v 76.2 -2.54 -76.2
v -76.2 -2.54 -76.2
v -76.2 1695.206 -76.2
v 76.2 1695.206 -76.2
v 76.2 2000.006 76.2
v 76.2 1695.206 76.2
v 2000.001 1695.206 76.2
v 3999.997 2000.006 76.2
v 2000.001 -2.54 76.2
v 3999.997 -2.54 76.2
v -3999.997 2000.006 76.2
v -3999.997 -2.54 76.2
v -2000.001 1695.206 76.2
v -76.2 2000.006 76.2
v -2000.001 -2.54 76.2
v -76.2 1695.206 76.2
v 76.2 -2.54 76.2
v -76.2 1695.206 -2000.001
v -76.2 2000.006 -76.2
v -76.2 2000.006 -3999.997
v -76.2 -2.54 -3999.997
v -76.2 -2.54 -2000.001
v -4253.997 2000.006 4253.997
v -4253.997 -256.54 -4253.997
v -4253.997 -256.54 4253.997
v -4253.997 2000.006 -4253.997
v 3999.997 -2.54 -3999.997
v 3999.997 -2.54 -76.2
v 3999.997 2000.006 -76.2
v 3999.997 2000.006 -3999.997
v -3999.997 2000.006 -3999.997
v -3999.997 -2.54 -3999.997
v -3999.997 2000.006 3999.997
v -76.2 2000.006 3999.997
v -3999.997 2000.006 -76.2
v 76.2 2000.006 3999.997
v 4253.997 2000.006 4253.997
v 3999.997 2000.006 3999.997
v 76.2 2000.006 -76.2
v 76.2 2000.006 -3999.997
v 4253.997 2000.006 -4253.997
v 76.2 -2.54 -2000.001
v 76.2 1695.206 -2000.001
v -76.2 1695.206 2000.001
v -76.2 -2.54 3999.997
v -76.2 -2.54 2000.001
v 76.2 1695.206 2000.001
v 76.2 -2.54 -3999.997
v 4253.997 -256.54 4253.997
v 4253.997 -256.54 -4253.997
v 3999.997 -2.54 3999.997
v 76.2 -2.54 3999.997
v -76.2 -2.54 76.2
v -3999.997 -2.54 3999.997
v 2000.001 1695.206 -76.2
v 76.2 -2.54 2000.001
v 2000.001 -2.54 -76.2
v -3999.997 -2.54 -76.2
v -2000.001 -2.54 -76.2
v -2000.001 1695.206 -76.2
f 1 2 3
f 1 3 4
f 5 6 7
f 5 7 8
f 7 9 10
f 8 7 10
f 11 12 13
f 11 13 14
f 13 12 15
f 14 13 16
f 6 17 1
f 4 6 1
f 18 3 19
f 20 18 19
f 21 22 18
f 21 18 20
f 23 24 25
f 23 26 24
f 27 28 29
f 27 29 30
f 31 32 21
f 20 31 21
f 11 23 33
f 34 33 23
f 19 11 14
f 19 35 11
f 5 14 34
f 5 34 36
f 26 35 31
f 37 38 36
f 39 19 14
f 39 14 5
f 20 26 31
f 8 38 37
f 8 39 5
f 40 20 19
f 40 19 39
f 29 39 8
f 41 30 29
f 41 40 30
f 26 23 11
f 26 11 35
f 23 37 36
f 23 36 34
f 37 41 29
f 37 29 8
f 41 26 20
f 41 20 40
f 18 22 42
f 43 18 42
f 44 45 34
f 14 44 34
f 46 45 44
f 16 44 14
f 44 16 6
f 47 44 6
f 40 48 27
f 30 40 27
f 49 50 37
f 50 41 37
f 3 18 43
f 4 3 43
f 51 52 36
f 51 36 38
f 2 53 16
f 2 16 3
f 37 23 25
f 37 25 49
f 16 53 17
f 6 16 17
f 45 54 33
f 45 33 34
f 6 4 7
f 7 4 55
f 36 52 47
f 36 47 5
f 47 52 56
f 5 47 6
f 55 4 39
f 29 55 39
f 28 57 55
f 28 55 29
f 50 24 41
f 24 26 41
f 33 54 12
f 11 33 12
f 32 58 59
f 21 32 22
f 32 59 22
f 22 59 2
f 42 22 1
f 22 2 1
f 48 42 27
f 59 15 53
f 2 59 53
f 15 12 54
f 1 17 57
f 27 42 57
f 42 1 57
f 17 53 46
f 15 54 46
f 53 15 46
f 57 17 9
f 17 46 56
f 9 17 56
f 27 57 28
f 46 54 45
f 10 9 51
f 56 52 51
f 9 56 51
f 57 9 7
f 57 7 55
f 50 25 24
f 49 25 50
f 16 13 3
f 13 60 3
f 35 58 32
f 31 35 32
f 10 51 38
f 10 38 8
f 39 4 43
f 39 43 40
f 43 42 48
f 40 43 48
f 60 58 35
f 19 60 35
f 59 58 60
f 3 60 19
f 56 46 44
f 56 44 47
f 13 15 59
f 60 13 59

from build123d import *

# Parameters (mm, degrees)
BOSS_EXTRUDE1_DEPTH      = 2000.00616
BOSS_EXTRUDE1_DEPTH_BACK = 2.54
SKETCH2_W                = 8507.99416
SKETCH2_H                = 8507.99416
SKETCH2_W_2              = 7999.99416
SKETCH2_H_2              = 7999.99416
SKETCH4_W                = 8507.99416
SKETCH4_H                = 8507.99416
BOSS_EXTRUDE2_DEPTH      = 254
SKETCH8_W                = 3923.79708
SKETCH8_H                = 76.2
SKETCH8_W_2              = 76.2
SKETCH8_H_2              = 3923.79708
BOSS_EXTRUDE3_DEPTH      = 304.8
SKETCH12_W               = 152.4
SKETCH12_H               = 152.4
BOSS_EXTRUDE5_DEPTH      = 1697.74616
SKETCH14_W               = 1999.996
SKETCH14_H               = 152.4
SKETCH14_W_2             = 152.4
SKETCH14_H_2             = 1999.996
BOSS_EXTRUDE6_DEPTH      = 1697.74616


with BuildPart() as part:
    # Sketch2 → Boss-Extrude1 (new, two sides: drawn at the far end of the back side and taken through both)
    with BuildSketch(Plane(origin=(0, 0, 0), x_dir=(1, 0, 0), z_dir=(0, 1, 0)).offset(-BOSS_EXTRUDE1_DEPTH_BACK)):
        Rectangle(SKETCH2_W, SKETCH2_H)
        Rectangle(SKETCH2_W_2, SKETCH2_H_2, mode=Mode.SUBTRACT)
    extrude(amount=BOSS_EXTRUDE1_DEPTH + BOSS_EXTRUDE1_DEPTH_BACK)

    # Sketch4 → Boss-Extrude2 (add)
    with BuildSketch(Plane.XZ.offset(2.54)):
        Rectangle(SKETCH4_W, SKETCH4_H)
    extrude(amount=BOSS_EXTRUDE2_DEPTH)


with BuildPart() as body_2:
    # Sketch8 → Boss-Extrude3 (new body)
    with BuildSketch(Plane(origin=(0, 2000.00616, 0), x_dir=(1, 0, 0), z_dir=(0, 1, 0))):
        with Locations((-2038.09854, 38.1)):
            Rectangle(SKETCH8_W, SKETCH8_H)
        with Locations((-2038.09854, -38.1)):
            Rectangle(SKETCH8_W, SKETCH8_H)
        with Locations((-38.1, -38.1)):
            Rectangle(SKETCH8_W_2, SKETCH8_H)
        with Locations((-38.1, 2038.09854)):
            Rectangle(SKETCH8_W_2, SKETCH8_H_2)
        with Locations((38.1, 2038.09854)):
            Rectangle(SKETCH8_W_2, SKETCH8_H_2)
        with Locations((2038.09854, 38.1)):
            Rectangle(SKETCH8_W, SKETCH8_H)
        with Locations((2038.09854, -38.1)):
            Rectangle(SKETCH8_W, SKETCH8_H)
        with Locations((38.1, -2038.09854)):
            Rectangle(SKETCH8_W_2, SKETCH8_H_2)
        with Locations((-38.1, -2038.09854)):
            Rectangle(SKETCH8_W_2, SKETCH8_H_2)
        with Locations((38.1, -38.1)):
            Rectangle(SKETCH8_W_2, SKETCH8_H)
        with Locations((38.1, 38.1)):
            Rectangle(SKETCH8_W_2, SKETCH8_H)
        with Locations((-38.1, 38.1)):
            Rectangle(SKETCH8_W_2, SKETCH8_H)
    extrude(amount=-BOSS_EXTRUDE3_DEPTH)

    # Combine1: union part
    add(part.part)

    # Sketch12 → Boss-Extrude5 (add)
    with BuildSketch(Plane(origin=(0, -2.54, 0), x_dir=(1, 0, 0), z_dir=(0, 1, 0))):
        Rectangle(SKETCH12_W, SKETCH12_H)
    extrude(amount=BOSS_EXTRUDE5_DEPTH)

    # Sketch14 → Boss-Extrude6 (add)
    with BuildSketch(Plane(origin=(0, -2.54, 0), x_dir=(1, 0, 0), z_dir=(0, 1, 0))):
        with Locations((-2999.99908, 0)):
            Rectangle(SKETCH14_W, SKETCH14_H)
        with Locations((0, 2999.99908)):
            Rectangle(SKETCH14_W_2, SKETCH14_H_2)
        with Locations((2999.99908, 0)):
            Rectangle(SKETCH14_W, SKETCH14_H)
        with Locations((0, -2999.99908)):
            Rectangle(SKETCH14_W_2, SKETCH14_H_2)
    extrude(amount=BOSS_EXTRUDE6_DEPTH)


solid = body_2.part
